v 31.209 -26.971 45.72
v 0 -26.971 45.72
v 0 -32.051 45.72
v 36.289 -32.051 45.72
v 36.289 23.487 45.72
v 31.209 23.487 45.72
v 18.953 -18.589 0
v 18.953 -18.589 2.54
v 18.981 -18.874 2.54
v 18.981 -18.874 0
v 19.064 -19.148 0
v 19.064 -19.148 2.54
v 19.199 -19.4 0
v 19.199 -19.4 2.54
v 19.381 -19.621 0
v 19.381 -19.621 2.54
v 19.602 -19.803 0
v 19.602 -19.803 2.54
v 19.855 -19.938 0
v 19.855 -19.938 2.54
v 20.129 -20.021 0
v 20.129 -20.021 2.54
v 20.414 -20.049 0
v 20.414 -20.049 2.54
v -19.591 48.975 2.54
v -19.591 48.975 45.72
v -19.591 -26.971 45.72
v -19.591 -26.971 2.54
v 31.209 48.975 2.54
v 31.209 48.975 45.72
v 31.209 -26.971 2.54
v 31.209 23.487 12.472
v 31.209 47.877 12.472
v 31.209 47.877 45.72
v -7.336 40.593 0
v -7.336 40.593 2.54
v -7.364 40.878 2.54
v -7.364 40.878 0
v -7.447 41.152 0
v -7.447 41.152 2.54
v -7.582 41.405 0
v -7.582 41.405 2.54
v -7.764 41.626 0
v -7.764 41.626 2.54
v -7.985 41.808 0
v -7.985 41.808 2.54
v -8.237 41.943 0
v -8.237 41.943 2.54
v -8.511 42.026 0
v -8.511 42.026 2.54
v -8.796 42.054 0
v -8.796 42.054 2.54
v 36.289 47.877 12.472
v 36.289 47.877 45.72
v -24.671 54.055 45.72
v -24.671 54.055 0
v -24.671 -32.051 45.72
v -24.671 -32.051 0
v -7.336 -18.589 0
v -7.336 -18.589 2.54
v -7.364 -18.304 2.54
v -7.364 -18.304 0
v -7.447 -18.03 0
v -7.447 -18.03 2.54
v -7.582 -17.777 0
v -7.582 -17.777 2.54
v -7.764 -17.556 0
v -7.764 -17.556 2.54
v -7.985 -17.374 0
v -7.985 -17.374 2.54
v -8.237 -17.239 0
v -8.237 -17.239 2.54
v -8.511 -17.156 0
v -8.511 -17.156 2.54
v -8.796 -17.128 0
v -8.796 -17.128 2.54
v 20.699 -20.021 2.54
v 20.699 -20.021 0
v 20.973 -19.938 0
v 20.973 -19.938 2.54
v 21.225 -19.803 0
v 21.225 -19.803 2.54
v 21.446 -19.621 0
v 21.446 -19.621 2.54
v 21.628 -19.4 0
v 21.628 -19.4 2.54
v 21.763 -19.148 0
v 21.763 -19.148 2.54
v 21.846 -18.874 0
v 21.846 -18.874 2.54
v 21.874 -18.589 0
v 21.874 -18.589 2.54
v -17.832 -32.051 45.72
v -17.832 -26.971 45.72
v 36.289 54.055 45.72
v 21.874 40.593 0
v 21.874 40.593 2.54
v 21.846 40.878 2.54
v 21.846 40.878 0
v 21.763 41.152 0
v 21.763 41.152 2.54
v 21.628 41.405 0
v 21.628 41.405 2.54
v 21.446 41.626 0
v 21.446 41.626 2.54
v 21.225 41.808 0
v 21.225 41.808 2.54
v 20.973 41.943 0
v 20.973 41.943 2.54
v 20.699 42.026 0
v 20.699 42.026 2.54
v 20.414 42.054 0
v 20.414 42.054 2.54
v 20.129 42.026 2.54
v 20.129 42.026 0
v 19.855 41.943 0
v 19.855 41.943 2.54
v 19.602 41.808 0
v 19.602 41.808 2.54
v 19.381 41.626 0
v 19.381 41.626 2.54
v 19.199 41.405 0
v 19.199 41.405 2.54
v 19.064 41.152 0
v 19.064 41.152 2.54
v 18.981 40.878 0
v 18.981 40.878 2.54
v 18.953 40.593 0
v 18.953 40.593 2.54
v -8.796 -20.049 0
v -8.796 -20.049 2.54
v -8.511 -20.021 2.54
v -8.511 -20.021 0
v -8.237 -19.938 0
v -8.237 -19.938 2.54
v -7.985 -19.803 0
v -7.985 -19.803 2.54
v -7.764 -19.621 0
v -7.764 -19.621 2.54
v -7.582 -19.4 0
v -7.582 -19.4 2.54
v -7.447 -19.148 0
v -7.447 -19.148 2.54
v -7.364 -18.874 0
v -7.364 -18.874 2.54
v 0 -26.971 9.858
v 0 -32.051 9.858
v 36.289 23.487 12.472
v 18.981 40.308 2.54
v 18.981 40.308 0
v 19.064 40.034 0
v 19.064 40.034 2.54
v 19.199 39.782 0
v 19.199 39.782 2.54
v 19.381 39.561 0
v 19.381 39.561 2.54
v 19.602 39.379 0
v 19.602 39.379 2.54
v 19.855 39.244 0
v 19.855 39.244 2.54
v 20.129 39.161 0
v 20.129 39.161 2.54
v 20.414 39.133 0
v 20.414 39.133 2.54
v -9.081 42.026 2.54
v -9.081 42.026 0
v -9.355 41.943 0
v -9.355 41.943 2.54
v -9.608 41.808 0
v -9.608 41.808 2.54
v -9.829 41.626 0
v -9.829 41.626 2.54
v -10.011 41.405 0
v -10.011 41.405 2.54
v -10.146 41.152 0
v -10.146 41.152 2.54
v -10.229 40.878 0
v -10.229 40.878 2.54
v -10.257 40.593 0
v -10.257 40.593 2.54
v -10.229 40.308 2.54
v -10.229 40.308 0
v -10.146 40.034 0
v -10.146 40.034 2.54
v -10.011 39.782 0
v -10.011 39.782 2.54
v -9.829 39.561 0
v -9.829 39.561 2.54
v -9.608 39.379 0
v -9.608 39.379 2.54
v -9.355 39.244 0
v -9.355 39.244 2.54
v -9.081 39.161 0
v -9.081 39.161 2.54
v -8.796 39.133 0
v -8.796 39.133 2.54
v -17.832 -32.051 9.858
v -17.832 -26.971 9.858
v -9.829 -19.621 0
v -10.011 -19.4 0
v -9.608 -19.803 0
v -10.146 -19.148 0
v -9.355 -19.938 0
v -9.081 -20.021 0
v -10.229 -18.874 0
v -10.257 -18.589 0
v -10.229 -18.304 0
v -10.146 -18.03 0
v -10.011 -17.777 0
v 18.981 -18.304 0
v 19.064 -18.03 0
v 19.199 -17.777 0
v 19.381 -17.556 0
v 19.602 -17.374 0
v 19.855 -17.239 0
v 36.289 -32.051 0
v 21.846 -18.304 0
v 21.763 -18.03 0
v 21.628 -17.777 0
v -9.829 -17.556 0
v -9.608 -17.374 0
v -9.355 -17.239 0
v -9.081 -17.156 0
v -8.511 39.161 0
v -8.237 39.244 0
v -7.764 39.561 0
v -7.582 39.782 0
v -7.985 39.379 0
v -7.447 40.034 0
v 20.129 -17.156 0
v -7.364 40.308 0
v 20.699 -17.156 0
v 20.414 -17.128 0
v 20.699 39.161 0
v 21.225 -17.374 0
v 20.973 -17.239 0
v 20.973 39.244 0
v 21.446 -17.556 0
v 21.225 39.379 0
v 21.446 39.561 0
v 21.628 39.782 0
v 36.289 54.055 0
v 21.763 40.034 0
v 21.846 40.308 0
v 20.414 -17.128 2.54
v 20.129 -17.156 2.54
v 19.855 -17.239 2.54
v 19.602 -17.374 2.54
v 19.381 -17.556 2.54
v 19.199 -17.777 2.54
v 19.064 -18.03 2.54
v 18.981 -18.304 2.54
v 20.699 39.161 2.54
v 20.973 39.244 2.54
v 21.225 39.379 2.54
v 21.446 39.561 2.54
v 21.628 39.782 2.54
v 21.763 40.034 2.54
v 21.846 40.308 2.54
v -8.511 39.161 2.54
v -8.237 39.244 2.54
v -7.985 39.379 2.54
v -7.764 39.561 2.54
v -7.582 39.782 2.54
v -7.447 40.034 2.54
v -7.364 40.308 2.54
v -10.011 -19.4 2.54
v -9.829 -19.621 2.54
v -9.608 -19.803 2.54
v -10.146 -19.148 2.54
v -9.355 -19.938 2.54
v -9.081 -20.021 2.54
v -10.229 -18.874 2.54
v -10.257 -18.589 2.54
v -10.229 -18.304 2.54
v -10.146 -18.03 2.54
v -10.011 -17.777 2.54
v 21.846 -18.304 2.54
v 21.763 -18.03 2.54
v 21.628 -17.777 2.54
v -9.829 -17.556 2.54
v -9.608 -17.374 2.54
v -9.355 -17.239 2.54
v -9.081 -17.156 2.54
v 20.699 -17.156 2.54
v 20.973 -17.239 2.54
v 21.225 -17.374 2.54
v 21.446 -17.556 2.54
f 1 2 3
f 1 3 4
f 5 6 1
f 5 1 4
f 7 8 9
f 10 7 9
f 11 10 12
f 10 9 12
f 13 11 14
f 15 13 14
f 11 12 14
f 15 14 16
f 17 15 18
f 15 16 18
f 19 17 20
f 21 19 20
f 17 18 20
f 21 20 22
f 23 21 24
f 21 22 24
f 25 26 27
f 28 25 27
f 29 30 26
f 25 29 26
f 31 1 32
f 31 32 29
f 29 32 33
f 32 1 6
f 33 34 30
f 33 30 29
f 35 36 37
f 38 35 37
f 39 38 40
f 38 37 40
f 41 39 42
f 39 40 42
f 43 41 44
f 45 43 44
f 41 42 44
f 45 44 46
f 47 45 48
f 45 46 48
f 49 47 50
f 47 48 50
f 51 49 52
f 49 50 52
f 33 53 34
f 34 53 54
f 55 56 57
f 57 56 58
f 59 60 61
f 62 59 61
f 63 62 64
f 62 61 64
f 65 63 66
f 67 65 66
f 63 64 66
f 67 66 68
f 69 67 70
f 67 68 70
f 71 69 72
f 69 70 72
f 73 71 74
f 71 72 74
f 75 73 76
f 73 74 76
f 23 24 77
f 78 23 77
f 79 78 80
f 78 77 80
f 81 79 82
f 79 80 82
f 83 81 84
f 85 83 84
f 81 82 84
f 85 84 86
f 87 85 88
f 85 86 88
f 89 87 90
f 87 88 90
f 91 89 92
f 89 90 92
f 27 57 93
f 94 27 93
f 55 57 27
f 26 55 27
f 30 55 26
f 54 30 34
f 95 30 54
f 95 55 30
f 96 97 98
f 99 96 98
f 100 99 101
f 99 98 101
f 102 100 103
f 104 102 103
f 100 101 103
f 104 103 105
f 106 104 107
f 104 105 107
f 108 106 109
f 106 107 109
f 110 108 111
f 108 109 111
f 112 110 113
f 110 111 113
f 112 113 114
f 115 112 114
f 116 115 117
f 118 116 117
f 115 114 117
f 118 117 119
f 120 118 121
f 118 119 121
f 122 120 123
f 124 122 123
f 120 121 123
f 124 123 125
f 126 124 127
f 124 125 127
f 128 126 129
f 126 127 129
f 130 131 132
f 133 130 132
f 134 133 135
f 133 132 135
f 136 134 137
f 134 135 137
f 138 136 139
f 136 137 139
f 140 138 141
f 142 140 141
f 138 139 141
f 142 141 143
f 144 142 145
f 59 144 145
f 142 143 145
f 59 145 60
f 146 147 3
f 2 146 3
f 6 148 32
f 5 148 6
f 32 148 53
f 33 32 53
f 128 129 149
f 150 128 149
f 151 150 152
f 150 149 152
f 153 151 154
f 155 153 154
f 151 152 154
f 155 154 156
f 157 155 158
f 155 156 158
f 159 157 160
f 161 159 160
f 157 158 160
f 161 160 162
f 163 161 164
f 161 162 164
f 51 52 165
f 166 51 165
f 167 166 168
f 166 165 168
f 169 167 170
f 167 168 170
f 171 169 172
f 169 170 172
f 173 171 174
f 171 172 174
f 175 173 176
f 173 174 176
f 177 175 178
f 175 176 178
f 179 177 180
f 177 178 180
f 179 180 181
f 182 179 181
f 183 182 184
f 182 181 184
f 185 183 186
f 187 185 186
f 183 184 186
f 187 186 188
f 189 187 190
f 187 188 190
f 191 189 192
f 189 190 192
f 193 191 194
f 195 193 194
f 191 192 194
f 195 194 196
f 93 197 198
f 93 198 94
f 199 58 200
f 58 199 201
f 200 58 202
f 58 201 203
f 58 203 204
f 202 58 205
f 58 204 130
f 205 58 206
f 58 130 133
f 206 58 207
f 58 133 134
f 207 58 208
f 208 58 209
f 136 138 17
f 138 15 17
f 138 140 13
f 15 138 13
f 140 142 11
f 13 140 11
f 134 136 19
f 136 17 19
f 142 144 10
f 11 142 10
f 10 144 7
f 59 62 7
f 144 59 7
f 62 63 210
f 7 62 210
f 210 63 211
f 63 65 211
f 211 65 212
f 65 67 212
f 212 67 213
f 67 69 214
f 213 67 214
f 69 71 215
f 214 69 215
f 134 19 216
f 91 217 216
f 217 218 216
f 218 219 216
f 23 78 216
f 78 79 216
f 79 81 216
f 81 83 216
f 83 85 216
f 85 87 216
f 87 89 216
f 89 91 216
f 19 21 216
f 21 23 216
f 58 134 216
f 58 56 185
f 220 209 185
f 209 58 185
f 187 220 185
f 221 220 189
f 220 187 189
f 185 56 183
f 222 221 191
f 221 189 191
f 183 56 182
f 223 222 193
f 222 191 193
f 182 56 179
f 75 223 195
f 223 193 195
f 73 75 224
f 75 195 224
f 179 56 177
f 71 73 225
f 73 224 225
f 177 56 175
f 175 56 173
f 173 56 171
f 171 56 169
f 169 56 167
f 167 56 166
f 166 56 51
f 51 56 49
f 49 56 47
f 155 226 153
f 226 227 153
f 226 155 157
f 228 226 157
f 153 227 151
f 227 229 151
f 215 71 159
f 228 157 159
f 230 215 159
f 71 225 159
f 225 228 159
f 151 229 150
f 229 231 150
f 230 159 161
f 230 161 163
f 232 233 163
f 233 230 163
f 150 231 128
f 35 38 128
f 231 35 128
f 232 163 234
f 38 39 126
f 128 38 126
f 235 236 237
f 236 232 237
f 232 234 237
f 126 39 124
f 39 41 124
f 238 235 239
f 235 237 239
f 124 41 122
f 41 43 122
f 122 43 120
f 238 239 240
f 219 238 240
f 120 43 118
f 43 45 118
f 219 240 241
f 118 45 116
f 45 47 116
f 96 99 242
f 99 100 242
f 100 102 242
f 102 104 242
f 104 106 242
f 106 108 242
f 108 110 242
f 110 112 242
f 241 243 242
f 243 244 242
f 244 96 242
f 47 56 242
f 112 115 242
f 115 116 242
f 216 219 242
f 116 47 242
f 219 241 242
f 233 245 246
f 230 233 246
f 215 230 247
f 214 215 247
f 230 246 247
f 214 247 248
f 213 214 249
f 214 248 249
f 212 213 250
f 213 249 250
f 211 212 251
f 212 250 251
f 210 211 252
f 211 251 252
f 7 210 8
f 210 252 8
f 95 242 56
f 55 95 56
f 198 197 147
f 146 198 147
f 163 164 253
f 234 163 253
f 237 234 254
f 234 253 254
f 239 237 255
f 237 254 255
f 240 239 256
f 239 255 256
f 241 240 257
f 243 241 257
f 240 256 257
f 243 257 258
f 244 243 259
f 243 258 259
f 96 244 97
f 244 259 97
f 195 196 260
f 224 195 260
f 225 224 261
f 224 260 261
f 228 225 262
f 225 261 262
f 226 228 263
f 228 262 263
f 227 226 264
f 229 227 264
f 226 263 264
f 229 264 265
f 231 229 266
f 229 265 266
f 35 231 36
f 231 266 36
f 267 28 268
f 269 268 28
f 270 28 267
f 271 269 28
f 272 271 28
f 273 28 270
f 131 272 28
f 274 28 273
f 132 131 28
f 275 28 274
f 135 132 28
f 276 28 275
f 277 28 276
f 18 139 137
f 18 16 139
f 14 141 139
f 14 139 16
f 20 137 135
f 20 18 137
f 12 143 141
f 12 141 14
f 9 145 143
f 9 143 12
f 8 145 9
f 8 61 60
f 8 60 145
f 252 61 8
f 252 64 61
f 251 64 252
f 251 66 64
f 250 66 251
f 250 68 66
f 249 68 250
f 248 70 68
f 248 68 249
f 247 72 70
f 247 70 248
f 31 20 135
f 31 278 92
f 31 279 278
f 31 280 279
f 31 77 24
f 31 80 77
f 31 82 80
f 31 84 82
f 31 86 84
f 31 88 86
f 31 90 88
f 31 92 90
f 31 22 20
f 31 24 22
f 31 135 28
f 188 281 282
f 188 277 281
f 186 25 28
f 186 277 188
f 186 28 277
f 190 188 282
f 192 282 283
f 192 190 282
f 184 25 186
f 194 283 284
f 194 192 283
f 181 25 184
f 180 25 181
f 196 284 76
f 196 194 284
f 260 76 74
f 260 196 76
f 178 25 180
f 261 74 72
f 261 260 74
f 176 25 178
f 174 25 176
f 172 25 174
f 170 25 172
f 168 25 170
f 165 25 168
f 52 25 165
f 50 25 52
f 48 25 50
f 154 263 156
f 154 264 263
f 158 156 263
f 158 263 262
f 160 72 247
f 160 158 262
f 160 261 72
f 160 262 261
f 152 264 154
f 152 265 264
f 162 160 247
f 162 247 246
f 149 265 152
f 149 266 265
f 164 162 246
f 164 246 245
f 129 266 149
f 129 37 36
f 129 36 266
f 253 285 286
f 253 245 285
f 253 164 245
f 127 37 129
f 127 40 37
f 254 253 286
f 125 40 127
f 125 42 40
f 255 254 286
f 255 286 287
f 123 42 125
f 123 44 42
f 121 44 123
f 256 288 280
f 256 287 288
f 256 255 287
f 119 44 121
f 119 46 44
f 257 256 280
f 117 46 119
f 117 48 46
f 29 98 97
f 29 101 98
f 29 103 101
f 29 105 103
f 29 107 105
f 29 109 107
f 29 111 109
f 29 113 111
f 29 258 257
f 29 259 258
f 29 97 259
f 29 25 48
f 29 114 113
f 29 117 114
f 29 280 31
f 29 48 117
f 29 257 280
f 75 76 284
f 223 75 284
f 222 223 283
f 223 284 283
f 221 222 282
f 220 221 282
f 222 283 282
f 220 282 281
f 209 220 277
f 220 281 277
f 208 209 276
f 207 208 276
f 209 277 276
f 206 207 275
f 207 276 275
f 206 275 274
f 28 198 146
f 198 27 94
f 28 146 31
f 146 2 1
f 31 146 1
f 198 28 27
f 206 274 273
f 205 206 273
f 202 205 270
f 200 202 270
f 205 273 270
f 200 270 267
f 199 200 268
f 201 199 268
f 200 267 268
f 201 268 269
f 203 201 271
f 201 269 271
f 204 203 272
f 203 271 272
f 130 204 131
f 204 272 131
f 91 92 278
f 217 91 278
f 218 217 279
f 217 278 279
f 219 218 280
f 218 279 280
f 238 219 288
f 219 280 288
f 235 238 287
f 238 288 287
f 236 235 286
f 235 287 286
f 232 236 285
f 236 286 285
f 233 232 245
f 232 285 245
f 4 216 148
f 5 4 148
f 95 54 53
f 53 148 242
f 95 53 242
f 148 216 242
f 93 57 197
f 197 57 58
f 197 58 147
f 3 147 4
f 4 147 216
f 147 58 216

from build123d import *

# Parameters (mm, degrees)
F0_W     = 20.6896286374
F0_H     = 8.5261184722
F1_DEPTH = 45.72
F3_DEPTH = 43.18
F5_DEPTH = 25.4
F6_W     = 24.390142411
F6_H     = 33.248395839
F7_DEPTH = 25.4
F8_W     = 17.8320128471
F8_H     = 35.8616813955
F9_DEPTH = 25.4


with BuildPart() as f1:
    # F0 (on Top) → F1 (new body)
    with BuildSketch(Plane.XY):
        Polygon((36.2886708146, 54.0553010044), (-24.6713291854, 54.0553010044), (-24.6713291854, -32.0506989956), (15.5990421772, -32.0506989956), (15.5990421772, -23.5245805234), (36.2886708146, -23.5245805234), align=None)
        with Locations((25.9438564959, -27.7876397595)):
            Rectangle(F0_W, F0_H)
    extrude(amount=F1_DEPTH)

    # F2 (on face) → F3 (cut)
    with BuildSketch(Plane.XY.offset(45.72)):
        Polygon((5.8086708146, 48.9753010044), (-19.5913291854, 48.9753010044), (-19.5913291854, 11.0023010044), (-19.5913291854, -26.9706989956), (5.8086708146, -26.9706989956), (31.2086708146, -26.9706989956), (31.2086708146, 11.0023010044), (31.2086708146, 48.9753010044), align=None)
    extrude(amount=-F3_DEPTH, mode=Mode.SUBTRACT)

    # F4 (on face) → F5 (cut)
    with BuildSketch(Plane.XY.offset(2.54)):
        with BuildLine():
            Line((-8.7963291854, 40.5933010044), (-10.2568291854, 40.5933010044))
            ThreePointArc((-10.2568291854, 40.5933010044), (-9.8290586393, 39.5605715505), (-8.7963291854, 39.1328010044))
            Line((-8.7963291854, 39.1328010044), (-8.7963291854, 40.5933010044))
        make_face()
        with BuildLine():
            Line((-7.3358291854, 40.5933010044), (-8.7963291854, 40.5933010044))
            Line((-8.7963291854, 40.5933010044), (-8.7963291854, 39.1328010044))
            ThreePointArc((-8.7963291854, 39.1328010044), (-7.7635997314, 39.5605715505), (-7.3358291854, 40.5933010044))
        make_face()
        with BuildLine():
            ThreePointArc((-7.3358291854, 40.5933010044), (-7.7635997314, 41.6260304583), (-8.7963291854, 42.0538010044))
            Line((-8.7963291854, 42.0538010044), (-8.7963291854, 40.5933010044))
            Line((-8.7963291854, 40.5933010044), (-7.3358291854, 40.5933010044))
        make_face()
        with BuildLine():
            ThreePointArc((-8.7963291854, 42.0538010044), (-9.8290586393, 41.6260304583), (-10.2568291854, 40.5933010044))
            Line((-10.2568291854, 40.5933010044), (-8.7963291854, 40.5933010044))
            Line((-8.7963291854, 40.5933010044), (-8.7963291854, 42.0538010044))
        make_face()
        with BuildLine():
            Line((-8.7963291854, -17.1281989956), (-8.7963291854, -18.5886989956))
            Line((-8.7963291854, -18.5886989956), (-7.3358291854, -18.5886989956))
            ThreePointArc((-7.3358291854, -18.5886989956), (-7.7635997314, -17.5559695417), (-8.7963291854, -17.1281989956))
        make_face()
        with BuildLine():
            Line((-8.7963291854, -18.5886989956), (-10.2568291854, -18.5886989956))
            ThreePointArc((-10.2568291854, -18.5886989956), (-9.8290586393, -19.6214284495), (-8.7963291854, -20.0491989956))
            Line((-8.7963291854, -20.0491989956), (-8.7963291854, -18.5886989956))
        make_face()
        with BuildLine():
            Line((-7.3358291854, -18.5886989956), (-8.7963291854, -18.5886989956))
            Line((-8.7963291854, -18.5886989956), (-8.7963291854, -20.0491989956))
            ThreePointArc((-8.7963291854, -20.0491989956), (-7.7635997314, -19.6214284495), (-7.3358291854, -18.5886989956))
        make_face()
        with BuildLine():
            ThreePointArc((-8.7963291854, -17.1281989956), (-9.8290586393, -17.5559695417), (-10.2568291854, -18.5886989956))
            Line((-10.2568291854, -18.5886989956), (-8.7963291854, -18.5886989956))
            Line((-8.7963291854, -18.5886989956), (-8.7963291854, -17.1281989956))
        make_face()
        with BuildLine():
            ThreePointArc((21.8741708146, 40.5933010044), (21.4464002686, 41.6260304583), (20.4136708146, 42.0538010044))
            Line((20.4136708146, 42.0538010044), (20.4136708146, 40.5933010044))
            Line((20.4136708146, 40.5933010044), (21.8741708146, 40.5933010044))
        make_face()
        with BuildLine():
            Line((21.8741708146, 40.5933010044), (20.4136708146, 40.5933010044))
            Line((20.4136708146, 40.5933010044), (20.4136708146, 39.1328010044))
            ThreePointArc((20.4136708146, 39.1328010044), (21.4464002686, 39.5605715505), (21.8741708146, 40.5933010044))
        make_face()
        with BuildLine():
            Line((20.4136708146, 40.5933010044), (18.9531708146, 40.5933010044))
            ThreePointArc((18.9531708146, 40.5933010044), (19.3809413607, 39.5605715505), (20.4136708146, 39.1328010044))
            Line((20.4136708146, 39.1328010044), (20.4136708146, 40.5933010044))
        make_face()
        with BuildLine():
            Line((20.4136708146, 40.5933010044), (20.4136708146, 42.0538010044))
            ThreePointArc((20.4136708146, 42.0538010044), (19.3809413607, 41.6260304583), (18.9531708146, 40.5933010044))
            Line((18.9531708146, 40.5933010044), (20.4136708146, 40.5933010044))
        make_face()
        with BuildLine():
            ThreePointArc((21.8741708146, -18.5886989956), (21.4464002686, -17.5559695417), (20.4136708146, -17.1281989956))
            Line((20.4136708146, -17.1281989956), (20.4136708146, -18.5886989956))
            Line((20.4136708146, -18.5886989956), (21.8741708146, -18.5886989956))
        make_face()
        with BuildLine():
            ThreePointArc((20.4136708146, -17.1281989956), (19.3809413607, -17.5559695417), (18.9531708146, -18.5886989956))
            Line((18.9531708146, -18.5886989956), (20.4136708146, -18.5886989956))
            Line((20.4136708146, -18.5886989956), (20.4136708146, -17.1281989956))
        make_face()
        with BuildLine():
            ThreePointArc((18.9531708146, -18.5886989956), (19.3809413607, -19.6214284495), (20.4136708146, -20.0491989956))
            Line((20.4136708146, -20.0491989956), (20.4136708146, -18.5886989956))
            Line((20.4136708146, -18.5886989956), (18.9531708146, -18.5886989956))
        make_face()
        with BuildLine():
            Line((20.4136708146, -18.5886989956), (20.4136708146, -20.0491989956))
            ThreePointArc((20.4136708146, -20.0491989956), (21.4464002686, -19.6214284495), (21.8741708146, -18.5886989956))
            Line((21.8741708146, -18.5886989956), (20.4136708146, -18.5886989956))
        make_face()
    extrude(amount=-F5_DEPTH, mode=Mode.SUBTRACT)

    # F6 (on face) → F7 (cut)
    with BuildSketch(Plane.YZ.offset(36.2886708146)):
        with Locations((35.6818791479, 29.0958020805)):
            Rectangle(F6_W, F6_H)
    extrude(amount=-F7_DEPTH, mode=Mode.SUBTRACT)

    # F8 (on face) → F9 (cut)
    with BuildSketch(Plane.XZ.offset(32.0506989956)):
        with Locations((-8.9160064235, 27.7891593023)):
            Rectangle(F8_W, F8_H)
    extrude(amount=-F9_DEPTH, mode=Mode.SUBTRACT)


solid = f1.part
